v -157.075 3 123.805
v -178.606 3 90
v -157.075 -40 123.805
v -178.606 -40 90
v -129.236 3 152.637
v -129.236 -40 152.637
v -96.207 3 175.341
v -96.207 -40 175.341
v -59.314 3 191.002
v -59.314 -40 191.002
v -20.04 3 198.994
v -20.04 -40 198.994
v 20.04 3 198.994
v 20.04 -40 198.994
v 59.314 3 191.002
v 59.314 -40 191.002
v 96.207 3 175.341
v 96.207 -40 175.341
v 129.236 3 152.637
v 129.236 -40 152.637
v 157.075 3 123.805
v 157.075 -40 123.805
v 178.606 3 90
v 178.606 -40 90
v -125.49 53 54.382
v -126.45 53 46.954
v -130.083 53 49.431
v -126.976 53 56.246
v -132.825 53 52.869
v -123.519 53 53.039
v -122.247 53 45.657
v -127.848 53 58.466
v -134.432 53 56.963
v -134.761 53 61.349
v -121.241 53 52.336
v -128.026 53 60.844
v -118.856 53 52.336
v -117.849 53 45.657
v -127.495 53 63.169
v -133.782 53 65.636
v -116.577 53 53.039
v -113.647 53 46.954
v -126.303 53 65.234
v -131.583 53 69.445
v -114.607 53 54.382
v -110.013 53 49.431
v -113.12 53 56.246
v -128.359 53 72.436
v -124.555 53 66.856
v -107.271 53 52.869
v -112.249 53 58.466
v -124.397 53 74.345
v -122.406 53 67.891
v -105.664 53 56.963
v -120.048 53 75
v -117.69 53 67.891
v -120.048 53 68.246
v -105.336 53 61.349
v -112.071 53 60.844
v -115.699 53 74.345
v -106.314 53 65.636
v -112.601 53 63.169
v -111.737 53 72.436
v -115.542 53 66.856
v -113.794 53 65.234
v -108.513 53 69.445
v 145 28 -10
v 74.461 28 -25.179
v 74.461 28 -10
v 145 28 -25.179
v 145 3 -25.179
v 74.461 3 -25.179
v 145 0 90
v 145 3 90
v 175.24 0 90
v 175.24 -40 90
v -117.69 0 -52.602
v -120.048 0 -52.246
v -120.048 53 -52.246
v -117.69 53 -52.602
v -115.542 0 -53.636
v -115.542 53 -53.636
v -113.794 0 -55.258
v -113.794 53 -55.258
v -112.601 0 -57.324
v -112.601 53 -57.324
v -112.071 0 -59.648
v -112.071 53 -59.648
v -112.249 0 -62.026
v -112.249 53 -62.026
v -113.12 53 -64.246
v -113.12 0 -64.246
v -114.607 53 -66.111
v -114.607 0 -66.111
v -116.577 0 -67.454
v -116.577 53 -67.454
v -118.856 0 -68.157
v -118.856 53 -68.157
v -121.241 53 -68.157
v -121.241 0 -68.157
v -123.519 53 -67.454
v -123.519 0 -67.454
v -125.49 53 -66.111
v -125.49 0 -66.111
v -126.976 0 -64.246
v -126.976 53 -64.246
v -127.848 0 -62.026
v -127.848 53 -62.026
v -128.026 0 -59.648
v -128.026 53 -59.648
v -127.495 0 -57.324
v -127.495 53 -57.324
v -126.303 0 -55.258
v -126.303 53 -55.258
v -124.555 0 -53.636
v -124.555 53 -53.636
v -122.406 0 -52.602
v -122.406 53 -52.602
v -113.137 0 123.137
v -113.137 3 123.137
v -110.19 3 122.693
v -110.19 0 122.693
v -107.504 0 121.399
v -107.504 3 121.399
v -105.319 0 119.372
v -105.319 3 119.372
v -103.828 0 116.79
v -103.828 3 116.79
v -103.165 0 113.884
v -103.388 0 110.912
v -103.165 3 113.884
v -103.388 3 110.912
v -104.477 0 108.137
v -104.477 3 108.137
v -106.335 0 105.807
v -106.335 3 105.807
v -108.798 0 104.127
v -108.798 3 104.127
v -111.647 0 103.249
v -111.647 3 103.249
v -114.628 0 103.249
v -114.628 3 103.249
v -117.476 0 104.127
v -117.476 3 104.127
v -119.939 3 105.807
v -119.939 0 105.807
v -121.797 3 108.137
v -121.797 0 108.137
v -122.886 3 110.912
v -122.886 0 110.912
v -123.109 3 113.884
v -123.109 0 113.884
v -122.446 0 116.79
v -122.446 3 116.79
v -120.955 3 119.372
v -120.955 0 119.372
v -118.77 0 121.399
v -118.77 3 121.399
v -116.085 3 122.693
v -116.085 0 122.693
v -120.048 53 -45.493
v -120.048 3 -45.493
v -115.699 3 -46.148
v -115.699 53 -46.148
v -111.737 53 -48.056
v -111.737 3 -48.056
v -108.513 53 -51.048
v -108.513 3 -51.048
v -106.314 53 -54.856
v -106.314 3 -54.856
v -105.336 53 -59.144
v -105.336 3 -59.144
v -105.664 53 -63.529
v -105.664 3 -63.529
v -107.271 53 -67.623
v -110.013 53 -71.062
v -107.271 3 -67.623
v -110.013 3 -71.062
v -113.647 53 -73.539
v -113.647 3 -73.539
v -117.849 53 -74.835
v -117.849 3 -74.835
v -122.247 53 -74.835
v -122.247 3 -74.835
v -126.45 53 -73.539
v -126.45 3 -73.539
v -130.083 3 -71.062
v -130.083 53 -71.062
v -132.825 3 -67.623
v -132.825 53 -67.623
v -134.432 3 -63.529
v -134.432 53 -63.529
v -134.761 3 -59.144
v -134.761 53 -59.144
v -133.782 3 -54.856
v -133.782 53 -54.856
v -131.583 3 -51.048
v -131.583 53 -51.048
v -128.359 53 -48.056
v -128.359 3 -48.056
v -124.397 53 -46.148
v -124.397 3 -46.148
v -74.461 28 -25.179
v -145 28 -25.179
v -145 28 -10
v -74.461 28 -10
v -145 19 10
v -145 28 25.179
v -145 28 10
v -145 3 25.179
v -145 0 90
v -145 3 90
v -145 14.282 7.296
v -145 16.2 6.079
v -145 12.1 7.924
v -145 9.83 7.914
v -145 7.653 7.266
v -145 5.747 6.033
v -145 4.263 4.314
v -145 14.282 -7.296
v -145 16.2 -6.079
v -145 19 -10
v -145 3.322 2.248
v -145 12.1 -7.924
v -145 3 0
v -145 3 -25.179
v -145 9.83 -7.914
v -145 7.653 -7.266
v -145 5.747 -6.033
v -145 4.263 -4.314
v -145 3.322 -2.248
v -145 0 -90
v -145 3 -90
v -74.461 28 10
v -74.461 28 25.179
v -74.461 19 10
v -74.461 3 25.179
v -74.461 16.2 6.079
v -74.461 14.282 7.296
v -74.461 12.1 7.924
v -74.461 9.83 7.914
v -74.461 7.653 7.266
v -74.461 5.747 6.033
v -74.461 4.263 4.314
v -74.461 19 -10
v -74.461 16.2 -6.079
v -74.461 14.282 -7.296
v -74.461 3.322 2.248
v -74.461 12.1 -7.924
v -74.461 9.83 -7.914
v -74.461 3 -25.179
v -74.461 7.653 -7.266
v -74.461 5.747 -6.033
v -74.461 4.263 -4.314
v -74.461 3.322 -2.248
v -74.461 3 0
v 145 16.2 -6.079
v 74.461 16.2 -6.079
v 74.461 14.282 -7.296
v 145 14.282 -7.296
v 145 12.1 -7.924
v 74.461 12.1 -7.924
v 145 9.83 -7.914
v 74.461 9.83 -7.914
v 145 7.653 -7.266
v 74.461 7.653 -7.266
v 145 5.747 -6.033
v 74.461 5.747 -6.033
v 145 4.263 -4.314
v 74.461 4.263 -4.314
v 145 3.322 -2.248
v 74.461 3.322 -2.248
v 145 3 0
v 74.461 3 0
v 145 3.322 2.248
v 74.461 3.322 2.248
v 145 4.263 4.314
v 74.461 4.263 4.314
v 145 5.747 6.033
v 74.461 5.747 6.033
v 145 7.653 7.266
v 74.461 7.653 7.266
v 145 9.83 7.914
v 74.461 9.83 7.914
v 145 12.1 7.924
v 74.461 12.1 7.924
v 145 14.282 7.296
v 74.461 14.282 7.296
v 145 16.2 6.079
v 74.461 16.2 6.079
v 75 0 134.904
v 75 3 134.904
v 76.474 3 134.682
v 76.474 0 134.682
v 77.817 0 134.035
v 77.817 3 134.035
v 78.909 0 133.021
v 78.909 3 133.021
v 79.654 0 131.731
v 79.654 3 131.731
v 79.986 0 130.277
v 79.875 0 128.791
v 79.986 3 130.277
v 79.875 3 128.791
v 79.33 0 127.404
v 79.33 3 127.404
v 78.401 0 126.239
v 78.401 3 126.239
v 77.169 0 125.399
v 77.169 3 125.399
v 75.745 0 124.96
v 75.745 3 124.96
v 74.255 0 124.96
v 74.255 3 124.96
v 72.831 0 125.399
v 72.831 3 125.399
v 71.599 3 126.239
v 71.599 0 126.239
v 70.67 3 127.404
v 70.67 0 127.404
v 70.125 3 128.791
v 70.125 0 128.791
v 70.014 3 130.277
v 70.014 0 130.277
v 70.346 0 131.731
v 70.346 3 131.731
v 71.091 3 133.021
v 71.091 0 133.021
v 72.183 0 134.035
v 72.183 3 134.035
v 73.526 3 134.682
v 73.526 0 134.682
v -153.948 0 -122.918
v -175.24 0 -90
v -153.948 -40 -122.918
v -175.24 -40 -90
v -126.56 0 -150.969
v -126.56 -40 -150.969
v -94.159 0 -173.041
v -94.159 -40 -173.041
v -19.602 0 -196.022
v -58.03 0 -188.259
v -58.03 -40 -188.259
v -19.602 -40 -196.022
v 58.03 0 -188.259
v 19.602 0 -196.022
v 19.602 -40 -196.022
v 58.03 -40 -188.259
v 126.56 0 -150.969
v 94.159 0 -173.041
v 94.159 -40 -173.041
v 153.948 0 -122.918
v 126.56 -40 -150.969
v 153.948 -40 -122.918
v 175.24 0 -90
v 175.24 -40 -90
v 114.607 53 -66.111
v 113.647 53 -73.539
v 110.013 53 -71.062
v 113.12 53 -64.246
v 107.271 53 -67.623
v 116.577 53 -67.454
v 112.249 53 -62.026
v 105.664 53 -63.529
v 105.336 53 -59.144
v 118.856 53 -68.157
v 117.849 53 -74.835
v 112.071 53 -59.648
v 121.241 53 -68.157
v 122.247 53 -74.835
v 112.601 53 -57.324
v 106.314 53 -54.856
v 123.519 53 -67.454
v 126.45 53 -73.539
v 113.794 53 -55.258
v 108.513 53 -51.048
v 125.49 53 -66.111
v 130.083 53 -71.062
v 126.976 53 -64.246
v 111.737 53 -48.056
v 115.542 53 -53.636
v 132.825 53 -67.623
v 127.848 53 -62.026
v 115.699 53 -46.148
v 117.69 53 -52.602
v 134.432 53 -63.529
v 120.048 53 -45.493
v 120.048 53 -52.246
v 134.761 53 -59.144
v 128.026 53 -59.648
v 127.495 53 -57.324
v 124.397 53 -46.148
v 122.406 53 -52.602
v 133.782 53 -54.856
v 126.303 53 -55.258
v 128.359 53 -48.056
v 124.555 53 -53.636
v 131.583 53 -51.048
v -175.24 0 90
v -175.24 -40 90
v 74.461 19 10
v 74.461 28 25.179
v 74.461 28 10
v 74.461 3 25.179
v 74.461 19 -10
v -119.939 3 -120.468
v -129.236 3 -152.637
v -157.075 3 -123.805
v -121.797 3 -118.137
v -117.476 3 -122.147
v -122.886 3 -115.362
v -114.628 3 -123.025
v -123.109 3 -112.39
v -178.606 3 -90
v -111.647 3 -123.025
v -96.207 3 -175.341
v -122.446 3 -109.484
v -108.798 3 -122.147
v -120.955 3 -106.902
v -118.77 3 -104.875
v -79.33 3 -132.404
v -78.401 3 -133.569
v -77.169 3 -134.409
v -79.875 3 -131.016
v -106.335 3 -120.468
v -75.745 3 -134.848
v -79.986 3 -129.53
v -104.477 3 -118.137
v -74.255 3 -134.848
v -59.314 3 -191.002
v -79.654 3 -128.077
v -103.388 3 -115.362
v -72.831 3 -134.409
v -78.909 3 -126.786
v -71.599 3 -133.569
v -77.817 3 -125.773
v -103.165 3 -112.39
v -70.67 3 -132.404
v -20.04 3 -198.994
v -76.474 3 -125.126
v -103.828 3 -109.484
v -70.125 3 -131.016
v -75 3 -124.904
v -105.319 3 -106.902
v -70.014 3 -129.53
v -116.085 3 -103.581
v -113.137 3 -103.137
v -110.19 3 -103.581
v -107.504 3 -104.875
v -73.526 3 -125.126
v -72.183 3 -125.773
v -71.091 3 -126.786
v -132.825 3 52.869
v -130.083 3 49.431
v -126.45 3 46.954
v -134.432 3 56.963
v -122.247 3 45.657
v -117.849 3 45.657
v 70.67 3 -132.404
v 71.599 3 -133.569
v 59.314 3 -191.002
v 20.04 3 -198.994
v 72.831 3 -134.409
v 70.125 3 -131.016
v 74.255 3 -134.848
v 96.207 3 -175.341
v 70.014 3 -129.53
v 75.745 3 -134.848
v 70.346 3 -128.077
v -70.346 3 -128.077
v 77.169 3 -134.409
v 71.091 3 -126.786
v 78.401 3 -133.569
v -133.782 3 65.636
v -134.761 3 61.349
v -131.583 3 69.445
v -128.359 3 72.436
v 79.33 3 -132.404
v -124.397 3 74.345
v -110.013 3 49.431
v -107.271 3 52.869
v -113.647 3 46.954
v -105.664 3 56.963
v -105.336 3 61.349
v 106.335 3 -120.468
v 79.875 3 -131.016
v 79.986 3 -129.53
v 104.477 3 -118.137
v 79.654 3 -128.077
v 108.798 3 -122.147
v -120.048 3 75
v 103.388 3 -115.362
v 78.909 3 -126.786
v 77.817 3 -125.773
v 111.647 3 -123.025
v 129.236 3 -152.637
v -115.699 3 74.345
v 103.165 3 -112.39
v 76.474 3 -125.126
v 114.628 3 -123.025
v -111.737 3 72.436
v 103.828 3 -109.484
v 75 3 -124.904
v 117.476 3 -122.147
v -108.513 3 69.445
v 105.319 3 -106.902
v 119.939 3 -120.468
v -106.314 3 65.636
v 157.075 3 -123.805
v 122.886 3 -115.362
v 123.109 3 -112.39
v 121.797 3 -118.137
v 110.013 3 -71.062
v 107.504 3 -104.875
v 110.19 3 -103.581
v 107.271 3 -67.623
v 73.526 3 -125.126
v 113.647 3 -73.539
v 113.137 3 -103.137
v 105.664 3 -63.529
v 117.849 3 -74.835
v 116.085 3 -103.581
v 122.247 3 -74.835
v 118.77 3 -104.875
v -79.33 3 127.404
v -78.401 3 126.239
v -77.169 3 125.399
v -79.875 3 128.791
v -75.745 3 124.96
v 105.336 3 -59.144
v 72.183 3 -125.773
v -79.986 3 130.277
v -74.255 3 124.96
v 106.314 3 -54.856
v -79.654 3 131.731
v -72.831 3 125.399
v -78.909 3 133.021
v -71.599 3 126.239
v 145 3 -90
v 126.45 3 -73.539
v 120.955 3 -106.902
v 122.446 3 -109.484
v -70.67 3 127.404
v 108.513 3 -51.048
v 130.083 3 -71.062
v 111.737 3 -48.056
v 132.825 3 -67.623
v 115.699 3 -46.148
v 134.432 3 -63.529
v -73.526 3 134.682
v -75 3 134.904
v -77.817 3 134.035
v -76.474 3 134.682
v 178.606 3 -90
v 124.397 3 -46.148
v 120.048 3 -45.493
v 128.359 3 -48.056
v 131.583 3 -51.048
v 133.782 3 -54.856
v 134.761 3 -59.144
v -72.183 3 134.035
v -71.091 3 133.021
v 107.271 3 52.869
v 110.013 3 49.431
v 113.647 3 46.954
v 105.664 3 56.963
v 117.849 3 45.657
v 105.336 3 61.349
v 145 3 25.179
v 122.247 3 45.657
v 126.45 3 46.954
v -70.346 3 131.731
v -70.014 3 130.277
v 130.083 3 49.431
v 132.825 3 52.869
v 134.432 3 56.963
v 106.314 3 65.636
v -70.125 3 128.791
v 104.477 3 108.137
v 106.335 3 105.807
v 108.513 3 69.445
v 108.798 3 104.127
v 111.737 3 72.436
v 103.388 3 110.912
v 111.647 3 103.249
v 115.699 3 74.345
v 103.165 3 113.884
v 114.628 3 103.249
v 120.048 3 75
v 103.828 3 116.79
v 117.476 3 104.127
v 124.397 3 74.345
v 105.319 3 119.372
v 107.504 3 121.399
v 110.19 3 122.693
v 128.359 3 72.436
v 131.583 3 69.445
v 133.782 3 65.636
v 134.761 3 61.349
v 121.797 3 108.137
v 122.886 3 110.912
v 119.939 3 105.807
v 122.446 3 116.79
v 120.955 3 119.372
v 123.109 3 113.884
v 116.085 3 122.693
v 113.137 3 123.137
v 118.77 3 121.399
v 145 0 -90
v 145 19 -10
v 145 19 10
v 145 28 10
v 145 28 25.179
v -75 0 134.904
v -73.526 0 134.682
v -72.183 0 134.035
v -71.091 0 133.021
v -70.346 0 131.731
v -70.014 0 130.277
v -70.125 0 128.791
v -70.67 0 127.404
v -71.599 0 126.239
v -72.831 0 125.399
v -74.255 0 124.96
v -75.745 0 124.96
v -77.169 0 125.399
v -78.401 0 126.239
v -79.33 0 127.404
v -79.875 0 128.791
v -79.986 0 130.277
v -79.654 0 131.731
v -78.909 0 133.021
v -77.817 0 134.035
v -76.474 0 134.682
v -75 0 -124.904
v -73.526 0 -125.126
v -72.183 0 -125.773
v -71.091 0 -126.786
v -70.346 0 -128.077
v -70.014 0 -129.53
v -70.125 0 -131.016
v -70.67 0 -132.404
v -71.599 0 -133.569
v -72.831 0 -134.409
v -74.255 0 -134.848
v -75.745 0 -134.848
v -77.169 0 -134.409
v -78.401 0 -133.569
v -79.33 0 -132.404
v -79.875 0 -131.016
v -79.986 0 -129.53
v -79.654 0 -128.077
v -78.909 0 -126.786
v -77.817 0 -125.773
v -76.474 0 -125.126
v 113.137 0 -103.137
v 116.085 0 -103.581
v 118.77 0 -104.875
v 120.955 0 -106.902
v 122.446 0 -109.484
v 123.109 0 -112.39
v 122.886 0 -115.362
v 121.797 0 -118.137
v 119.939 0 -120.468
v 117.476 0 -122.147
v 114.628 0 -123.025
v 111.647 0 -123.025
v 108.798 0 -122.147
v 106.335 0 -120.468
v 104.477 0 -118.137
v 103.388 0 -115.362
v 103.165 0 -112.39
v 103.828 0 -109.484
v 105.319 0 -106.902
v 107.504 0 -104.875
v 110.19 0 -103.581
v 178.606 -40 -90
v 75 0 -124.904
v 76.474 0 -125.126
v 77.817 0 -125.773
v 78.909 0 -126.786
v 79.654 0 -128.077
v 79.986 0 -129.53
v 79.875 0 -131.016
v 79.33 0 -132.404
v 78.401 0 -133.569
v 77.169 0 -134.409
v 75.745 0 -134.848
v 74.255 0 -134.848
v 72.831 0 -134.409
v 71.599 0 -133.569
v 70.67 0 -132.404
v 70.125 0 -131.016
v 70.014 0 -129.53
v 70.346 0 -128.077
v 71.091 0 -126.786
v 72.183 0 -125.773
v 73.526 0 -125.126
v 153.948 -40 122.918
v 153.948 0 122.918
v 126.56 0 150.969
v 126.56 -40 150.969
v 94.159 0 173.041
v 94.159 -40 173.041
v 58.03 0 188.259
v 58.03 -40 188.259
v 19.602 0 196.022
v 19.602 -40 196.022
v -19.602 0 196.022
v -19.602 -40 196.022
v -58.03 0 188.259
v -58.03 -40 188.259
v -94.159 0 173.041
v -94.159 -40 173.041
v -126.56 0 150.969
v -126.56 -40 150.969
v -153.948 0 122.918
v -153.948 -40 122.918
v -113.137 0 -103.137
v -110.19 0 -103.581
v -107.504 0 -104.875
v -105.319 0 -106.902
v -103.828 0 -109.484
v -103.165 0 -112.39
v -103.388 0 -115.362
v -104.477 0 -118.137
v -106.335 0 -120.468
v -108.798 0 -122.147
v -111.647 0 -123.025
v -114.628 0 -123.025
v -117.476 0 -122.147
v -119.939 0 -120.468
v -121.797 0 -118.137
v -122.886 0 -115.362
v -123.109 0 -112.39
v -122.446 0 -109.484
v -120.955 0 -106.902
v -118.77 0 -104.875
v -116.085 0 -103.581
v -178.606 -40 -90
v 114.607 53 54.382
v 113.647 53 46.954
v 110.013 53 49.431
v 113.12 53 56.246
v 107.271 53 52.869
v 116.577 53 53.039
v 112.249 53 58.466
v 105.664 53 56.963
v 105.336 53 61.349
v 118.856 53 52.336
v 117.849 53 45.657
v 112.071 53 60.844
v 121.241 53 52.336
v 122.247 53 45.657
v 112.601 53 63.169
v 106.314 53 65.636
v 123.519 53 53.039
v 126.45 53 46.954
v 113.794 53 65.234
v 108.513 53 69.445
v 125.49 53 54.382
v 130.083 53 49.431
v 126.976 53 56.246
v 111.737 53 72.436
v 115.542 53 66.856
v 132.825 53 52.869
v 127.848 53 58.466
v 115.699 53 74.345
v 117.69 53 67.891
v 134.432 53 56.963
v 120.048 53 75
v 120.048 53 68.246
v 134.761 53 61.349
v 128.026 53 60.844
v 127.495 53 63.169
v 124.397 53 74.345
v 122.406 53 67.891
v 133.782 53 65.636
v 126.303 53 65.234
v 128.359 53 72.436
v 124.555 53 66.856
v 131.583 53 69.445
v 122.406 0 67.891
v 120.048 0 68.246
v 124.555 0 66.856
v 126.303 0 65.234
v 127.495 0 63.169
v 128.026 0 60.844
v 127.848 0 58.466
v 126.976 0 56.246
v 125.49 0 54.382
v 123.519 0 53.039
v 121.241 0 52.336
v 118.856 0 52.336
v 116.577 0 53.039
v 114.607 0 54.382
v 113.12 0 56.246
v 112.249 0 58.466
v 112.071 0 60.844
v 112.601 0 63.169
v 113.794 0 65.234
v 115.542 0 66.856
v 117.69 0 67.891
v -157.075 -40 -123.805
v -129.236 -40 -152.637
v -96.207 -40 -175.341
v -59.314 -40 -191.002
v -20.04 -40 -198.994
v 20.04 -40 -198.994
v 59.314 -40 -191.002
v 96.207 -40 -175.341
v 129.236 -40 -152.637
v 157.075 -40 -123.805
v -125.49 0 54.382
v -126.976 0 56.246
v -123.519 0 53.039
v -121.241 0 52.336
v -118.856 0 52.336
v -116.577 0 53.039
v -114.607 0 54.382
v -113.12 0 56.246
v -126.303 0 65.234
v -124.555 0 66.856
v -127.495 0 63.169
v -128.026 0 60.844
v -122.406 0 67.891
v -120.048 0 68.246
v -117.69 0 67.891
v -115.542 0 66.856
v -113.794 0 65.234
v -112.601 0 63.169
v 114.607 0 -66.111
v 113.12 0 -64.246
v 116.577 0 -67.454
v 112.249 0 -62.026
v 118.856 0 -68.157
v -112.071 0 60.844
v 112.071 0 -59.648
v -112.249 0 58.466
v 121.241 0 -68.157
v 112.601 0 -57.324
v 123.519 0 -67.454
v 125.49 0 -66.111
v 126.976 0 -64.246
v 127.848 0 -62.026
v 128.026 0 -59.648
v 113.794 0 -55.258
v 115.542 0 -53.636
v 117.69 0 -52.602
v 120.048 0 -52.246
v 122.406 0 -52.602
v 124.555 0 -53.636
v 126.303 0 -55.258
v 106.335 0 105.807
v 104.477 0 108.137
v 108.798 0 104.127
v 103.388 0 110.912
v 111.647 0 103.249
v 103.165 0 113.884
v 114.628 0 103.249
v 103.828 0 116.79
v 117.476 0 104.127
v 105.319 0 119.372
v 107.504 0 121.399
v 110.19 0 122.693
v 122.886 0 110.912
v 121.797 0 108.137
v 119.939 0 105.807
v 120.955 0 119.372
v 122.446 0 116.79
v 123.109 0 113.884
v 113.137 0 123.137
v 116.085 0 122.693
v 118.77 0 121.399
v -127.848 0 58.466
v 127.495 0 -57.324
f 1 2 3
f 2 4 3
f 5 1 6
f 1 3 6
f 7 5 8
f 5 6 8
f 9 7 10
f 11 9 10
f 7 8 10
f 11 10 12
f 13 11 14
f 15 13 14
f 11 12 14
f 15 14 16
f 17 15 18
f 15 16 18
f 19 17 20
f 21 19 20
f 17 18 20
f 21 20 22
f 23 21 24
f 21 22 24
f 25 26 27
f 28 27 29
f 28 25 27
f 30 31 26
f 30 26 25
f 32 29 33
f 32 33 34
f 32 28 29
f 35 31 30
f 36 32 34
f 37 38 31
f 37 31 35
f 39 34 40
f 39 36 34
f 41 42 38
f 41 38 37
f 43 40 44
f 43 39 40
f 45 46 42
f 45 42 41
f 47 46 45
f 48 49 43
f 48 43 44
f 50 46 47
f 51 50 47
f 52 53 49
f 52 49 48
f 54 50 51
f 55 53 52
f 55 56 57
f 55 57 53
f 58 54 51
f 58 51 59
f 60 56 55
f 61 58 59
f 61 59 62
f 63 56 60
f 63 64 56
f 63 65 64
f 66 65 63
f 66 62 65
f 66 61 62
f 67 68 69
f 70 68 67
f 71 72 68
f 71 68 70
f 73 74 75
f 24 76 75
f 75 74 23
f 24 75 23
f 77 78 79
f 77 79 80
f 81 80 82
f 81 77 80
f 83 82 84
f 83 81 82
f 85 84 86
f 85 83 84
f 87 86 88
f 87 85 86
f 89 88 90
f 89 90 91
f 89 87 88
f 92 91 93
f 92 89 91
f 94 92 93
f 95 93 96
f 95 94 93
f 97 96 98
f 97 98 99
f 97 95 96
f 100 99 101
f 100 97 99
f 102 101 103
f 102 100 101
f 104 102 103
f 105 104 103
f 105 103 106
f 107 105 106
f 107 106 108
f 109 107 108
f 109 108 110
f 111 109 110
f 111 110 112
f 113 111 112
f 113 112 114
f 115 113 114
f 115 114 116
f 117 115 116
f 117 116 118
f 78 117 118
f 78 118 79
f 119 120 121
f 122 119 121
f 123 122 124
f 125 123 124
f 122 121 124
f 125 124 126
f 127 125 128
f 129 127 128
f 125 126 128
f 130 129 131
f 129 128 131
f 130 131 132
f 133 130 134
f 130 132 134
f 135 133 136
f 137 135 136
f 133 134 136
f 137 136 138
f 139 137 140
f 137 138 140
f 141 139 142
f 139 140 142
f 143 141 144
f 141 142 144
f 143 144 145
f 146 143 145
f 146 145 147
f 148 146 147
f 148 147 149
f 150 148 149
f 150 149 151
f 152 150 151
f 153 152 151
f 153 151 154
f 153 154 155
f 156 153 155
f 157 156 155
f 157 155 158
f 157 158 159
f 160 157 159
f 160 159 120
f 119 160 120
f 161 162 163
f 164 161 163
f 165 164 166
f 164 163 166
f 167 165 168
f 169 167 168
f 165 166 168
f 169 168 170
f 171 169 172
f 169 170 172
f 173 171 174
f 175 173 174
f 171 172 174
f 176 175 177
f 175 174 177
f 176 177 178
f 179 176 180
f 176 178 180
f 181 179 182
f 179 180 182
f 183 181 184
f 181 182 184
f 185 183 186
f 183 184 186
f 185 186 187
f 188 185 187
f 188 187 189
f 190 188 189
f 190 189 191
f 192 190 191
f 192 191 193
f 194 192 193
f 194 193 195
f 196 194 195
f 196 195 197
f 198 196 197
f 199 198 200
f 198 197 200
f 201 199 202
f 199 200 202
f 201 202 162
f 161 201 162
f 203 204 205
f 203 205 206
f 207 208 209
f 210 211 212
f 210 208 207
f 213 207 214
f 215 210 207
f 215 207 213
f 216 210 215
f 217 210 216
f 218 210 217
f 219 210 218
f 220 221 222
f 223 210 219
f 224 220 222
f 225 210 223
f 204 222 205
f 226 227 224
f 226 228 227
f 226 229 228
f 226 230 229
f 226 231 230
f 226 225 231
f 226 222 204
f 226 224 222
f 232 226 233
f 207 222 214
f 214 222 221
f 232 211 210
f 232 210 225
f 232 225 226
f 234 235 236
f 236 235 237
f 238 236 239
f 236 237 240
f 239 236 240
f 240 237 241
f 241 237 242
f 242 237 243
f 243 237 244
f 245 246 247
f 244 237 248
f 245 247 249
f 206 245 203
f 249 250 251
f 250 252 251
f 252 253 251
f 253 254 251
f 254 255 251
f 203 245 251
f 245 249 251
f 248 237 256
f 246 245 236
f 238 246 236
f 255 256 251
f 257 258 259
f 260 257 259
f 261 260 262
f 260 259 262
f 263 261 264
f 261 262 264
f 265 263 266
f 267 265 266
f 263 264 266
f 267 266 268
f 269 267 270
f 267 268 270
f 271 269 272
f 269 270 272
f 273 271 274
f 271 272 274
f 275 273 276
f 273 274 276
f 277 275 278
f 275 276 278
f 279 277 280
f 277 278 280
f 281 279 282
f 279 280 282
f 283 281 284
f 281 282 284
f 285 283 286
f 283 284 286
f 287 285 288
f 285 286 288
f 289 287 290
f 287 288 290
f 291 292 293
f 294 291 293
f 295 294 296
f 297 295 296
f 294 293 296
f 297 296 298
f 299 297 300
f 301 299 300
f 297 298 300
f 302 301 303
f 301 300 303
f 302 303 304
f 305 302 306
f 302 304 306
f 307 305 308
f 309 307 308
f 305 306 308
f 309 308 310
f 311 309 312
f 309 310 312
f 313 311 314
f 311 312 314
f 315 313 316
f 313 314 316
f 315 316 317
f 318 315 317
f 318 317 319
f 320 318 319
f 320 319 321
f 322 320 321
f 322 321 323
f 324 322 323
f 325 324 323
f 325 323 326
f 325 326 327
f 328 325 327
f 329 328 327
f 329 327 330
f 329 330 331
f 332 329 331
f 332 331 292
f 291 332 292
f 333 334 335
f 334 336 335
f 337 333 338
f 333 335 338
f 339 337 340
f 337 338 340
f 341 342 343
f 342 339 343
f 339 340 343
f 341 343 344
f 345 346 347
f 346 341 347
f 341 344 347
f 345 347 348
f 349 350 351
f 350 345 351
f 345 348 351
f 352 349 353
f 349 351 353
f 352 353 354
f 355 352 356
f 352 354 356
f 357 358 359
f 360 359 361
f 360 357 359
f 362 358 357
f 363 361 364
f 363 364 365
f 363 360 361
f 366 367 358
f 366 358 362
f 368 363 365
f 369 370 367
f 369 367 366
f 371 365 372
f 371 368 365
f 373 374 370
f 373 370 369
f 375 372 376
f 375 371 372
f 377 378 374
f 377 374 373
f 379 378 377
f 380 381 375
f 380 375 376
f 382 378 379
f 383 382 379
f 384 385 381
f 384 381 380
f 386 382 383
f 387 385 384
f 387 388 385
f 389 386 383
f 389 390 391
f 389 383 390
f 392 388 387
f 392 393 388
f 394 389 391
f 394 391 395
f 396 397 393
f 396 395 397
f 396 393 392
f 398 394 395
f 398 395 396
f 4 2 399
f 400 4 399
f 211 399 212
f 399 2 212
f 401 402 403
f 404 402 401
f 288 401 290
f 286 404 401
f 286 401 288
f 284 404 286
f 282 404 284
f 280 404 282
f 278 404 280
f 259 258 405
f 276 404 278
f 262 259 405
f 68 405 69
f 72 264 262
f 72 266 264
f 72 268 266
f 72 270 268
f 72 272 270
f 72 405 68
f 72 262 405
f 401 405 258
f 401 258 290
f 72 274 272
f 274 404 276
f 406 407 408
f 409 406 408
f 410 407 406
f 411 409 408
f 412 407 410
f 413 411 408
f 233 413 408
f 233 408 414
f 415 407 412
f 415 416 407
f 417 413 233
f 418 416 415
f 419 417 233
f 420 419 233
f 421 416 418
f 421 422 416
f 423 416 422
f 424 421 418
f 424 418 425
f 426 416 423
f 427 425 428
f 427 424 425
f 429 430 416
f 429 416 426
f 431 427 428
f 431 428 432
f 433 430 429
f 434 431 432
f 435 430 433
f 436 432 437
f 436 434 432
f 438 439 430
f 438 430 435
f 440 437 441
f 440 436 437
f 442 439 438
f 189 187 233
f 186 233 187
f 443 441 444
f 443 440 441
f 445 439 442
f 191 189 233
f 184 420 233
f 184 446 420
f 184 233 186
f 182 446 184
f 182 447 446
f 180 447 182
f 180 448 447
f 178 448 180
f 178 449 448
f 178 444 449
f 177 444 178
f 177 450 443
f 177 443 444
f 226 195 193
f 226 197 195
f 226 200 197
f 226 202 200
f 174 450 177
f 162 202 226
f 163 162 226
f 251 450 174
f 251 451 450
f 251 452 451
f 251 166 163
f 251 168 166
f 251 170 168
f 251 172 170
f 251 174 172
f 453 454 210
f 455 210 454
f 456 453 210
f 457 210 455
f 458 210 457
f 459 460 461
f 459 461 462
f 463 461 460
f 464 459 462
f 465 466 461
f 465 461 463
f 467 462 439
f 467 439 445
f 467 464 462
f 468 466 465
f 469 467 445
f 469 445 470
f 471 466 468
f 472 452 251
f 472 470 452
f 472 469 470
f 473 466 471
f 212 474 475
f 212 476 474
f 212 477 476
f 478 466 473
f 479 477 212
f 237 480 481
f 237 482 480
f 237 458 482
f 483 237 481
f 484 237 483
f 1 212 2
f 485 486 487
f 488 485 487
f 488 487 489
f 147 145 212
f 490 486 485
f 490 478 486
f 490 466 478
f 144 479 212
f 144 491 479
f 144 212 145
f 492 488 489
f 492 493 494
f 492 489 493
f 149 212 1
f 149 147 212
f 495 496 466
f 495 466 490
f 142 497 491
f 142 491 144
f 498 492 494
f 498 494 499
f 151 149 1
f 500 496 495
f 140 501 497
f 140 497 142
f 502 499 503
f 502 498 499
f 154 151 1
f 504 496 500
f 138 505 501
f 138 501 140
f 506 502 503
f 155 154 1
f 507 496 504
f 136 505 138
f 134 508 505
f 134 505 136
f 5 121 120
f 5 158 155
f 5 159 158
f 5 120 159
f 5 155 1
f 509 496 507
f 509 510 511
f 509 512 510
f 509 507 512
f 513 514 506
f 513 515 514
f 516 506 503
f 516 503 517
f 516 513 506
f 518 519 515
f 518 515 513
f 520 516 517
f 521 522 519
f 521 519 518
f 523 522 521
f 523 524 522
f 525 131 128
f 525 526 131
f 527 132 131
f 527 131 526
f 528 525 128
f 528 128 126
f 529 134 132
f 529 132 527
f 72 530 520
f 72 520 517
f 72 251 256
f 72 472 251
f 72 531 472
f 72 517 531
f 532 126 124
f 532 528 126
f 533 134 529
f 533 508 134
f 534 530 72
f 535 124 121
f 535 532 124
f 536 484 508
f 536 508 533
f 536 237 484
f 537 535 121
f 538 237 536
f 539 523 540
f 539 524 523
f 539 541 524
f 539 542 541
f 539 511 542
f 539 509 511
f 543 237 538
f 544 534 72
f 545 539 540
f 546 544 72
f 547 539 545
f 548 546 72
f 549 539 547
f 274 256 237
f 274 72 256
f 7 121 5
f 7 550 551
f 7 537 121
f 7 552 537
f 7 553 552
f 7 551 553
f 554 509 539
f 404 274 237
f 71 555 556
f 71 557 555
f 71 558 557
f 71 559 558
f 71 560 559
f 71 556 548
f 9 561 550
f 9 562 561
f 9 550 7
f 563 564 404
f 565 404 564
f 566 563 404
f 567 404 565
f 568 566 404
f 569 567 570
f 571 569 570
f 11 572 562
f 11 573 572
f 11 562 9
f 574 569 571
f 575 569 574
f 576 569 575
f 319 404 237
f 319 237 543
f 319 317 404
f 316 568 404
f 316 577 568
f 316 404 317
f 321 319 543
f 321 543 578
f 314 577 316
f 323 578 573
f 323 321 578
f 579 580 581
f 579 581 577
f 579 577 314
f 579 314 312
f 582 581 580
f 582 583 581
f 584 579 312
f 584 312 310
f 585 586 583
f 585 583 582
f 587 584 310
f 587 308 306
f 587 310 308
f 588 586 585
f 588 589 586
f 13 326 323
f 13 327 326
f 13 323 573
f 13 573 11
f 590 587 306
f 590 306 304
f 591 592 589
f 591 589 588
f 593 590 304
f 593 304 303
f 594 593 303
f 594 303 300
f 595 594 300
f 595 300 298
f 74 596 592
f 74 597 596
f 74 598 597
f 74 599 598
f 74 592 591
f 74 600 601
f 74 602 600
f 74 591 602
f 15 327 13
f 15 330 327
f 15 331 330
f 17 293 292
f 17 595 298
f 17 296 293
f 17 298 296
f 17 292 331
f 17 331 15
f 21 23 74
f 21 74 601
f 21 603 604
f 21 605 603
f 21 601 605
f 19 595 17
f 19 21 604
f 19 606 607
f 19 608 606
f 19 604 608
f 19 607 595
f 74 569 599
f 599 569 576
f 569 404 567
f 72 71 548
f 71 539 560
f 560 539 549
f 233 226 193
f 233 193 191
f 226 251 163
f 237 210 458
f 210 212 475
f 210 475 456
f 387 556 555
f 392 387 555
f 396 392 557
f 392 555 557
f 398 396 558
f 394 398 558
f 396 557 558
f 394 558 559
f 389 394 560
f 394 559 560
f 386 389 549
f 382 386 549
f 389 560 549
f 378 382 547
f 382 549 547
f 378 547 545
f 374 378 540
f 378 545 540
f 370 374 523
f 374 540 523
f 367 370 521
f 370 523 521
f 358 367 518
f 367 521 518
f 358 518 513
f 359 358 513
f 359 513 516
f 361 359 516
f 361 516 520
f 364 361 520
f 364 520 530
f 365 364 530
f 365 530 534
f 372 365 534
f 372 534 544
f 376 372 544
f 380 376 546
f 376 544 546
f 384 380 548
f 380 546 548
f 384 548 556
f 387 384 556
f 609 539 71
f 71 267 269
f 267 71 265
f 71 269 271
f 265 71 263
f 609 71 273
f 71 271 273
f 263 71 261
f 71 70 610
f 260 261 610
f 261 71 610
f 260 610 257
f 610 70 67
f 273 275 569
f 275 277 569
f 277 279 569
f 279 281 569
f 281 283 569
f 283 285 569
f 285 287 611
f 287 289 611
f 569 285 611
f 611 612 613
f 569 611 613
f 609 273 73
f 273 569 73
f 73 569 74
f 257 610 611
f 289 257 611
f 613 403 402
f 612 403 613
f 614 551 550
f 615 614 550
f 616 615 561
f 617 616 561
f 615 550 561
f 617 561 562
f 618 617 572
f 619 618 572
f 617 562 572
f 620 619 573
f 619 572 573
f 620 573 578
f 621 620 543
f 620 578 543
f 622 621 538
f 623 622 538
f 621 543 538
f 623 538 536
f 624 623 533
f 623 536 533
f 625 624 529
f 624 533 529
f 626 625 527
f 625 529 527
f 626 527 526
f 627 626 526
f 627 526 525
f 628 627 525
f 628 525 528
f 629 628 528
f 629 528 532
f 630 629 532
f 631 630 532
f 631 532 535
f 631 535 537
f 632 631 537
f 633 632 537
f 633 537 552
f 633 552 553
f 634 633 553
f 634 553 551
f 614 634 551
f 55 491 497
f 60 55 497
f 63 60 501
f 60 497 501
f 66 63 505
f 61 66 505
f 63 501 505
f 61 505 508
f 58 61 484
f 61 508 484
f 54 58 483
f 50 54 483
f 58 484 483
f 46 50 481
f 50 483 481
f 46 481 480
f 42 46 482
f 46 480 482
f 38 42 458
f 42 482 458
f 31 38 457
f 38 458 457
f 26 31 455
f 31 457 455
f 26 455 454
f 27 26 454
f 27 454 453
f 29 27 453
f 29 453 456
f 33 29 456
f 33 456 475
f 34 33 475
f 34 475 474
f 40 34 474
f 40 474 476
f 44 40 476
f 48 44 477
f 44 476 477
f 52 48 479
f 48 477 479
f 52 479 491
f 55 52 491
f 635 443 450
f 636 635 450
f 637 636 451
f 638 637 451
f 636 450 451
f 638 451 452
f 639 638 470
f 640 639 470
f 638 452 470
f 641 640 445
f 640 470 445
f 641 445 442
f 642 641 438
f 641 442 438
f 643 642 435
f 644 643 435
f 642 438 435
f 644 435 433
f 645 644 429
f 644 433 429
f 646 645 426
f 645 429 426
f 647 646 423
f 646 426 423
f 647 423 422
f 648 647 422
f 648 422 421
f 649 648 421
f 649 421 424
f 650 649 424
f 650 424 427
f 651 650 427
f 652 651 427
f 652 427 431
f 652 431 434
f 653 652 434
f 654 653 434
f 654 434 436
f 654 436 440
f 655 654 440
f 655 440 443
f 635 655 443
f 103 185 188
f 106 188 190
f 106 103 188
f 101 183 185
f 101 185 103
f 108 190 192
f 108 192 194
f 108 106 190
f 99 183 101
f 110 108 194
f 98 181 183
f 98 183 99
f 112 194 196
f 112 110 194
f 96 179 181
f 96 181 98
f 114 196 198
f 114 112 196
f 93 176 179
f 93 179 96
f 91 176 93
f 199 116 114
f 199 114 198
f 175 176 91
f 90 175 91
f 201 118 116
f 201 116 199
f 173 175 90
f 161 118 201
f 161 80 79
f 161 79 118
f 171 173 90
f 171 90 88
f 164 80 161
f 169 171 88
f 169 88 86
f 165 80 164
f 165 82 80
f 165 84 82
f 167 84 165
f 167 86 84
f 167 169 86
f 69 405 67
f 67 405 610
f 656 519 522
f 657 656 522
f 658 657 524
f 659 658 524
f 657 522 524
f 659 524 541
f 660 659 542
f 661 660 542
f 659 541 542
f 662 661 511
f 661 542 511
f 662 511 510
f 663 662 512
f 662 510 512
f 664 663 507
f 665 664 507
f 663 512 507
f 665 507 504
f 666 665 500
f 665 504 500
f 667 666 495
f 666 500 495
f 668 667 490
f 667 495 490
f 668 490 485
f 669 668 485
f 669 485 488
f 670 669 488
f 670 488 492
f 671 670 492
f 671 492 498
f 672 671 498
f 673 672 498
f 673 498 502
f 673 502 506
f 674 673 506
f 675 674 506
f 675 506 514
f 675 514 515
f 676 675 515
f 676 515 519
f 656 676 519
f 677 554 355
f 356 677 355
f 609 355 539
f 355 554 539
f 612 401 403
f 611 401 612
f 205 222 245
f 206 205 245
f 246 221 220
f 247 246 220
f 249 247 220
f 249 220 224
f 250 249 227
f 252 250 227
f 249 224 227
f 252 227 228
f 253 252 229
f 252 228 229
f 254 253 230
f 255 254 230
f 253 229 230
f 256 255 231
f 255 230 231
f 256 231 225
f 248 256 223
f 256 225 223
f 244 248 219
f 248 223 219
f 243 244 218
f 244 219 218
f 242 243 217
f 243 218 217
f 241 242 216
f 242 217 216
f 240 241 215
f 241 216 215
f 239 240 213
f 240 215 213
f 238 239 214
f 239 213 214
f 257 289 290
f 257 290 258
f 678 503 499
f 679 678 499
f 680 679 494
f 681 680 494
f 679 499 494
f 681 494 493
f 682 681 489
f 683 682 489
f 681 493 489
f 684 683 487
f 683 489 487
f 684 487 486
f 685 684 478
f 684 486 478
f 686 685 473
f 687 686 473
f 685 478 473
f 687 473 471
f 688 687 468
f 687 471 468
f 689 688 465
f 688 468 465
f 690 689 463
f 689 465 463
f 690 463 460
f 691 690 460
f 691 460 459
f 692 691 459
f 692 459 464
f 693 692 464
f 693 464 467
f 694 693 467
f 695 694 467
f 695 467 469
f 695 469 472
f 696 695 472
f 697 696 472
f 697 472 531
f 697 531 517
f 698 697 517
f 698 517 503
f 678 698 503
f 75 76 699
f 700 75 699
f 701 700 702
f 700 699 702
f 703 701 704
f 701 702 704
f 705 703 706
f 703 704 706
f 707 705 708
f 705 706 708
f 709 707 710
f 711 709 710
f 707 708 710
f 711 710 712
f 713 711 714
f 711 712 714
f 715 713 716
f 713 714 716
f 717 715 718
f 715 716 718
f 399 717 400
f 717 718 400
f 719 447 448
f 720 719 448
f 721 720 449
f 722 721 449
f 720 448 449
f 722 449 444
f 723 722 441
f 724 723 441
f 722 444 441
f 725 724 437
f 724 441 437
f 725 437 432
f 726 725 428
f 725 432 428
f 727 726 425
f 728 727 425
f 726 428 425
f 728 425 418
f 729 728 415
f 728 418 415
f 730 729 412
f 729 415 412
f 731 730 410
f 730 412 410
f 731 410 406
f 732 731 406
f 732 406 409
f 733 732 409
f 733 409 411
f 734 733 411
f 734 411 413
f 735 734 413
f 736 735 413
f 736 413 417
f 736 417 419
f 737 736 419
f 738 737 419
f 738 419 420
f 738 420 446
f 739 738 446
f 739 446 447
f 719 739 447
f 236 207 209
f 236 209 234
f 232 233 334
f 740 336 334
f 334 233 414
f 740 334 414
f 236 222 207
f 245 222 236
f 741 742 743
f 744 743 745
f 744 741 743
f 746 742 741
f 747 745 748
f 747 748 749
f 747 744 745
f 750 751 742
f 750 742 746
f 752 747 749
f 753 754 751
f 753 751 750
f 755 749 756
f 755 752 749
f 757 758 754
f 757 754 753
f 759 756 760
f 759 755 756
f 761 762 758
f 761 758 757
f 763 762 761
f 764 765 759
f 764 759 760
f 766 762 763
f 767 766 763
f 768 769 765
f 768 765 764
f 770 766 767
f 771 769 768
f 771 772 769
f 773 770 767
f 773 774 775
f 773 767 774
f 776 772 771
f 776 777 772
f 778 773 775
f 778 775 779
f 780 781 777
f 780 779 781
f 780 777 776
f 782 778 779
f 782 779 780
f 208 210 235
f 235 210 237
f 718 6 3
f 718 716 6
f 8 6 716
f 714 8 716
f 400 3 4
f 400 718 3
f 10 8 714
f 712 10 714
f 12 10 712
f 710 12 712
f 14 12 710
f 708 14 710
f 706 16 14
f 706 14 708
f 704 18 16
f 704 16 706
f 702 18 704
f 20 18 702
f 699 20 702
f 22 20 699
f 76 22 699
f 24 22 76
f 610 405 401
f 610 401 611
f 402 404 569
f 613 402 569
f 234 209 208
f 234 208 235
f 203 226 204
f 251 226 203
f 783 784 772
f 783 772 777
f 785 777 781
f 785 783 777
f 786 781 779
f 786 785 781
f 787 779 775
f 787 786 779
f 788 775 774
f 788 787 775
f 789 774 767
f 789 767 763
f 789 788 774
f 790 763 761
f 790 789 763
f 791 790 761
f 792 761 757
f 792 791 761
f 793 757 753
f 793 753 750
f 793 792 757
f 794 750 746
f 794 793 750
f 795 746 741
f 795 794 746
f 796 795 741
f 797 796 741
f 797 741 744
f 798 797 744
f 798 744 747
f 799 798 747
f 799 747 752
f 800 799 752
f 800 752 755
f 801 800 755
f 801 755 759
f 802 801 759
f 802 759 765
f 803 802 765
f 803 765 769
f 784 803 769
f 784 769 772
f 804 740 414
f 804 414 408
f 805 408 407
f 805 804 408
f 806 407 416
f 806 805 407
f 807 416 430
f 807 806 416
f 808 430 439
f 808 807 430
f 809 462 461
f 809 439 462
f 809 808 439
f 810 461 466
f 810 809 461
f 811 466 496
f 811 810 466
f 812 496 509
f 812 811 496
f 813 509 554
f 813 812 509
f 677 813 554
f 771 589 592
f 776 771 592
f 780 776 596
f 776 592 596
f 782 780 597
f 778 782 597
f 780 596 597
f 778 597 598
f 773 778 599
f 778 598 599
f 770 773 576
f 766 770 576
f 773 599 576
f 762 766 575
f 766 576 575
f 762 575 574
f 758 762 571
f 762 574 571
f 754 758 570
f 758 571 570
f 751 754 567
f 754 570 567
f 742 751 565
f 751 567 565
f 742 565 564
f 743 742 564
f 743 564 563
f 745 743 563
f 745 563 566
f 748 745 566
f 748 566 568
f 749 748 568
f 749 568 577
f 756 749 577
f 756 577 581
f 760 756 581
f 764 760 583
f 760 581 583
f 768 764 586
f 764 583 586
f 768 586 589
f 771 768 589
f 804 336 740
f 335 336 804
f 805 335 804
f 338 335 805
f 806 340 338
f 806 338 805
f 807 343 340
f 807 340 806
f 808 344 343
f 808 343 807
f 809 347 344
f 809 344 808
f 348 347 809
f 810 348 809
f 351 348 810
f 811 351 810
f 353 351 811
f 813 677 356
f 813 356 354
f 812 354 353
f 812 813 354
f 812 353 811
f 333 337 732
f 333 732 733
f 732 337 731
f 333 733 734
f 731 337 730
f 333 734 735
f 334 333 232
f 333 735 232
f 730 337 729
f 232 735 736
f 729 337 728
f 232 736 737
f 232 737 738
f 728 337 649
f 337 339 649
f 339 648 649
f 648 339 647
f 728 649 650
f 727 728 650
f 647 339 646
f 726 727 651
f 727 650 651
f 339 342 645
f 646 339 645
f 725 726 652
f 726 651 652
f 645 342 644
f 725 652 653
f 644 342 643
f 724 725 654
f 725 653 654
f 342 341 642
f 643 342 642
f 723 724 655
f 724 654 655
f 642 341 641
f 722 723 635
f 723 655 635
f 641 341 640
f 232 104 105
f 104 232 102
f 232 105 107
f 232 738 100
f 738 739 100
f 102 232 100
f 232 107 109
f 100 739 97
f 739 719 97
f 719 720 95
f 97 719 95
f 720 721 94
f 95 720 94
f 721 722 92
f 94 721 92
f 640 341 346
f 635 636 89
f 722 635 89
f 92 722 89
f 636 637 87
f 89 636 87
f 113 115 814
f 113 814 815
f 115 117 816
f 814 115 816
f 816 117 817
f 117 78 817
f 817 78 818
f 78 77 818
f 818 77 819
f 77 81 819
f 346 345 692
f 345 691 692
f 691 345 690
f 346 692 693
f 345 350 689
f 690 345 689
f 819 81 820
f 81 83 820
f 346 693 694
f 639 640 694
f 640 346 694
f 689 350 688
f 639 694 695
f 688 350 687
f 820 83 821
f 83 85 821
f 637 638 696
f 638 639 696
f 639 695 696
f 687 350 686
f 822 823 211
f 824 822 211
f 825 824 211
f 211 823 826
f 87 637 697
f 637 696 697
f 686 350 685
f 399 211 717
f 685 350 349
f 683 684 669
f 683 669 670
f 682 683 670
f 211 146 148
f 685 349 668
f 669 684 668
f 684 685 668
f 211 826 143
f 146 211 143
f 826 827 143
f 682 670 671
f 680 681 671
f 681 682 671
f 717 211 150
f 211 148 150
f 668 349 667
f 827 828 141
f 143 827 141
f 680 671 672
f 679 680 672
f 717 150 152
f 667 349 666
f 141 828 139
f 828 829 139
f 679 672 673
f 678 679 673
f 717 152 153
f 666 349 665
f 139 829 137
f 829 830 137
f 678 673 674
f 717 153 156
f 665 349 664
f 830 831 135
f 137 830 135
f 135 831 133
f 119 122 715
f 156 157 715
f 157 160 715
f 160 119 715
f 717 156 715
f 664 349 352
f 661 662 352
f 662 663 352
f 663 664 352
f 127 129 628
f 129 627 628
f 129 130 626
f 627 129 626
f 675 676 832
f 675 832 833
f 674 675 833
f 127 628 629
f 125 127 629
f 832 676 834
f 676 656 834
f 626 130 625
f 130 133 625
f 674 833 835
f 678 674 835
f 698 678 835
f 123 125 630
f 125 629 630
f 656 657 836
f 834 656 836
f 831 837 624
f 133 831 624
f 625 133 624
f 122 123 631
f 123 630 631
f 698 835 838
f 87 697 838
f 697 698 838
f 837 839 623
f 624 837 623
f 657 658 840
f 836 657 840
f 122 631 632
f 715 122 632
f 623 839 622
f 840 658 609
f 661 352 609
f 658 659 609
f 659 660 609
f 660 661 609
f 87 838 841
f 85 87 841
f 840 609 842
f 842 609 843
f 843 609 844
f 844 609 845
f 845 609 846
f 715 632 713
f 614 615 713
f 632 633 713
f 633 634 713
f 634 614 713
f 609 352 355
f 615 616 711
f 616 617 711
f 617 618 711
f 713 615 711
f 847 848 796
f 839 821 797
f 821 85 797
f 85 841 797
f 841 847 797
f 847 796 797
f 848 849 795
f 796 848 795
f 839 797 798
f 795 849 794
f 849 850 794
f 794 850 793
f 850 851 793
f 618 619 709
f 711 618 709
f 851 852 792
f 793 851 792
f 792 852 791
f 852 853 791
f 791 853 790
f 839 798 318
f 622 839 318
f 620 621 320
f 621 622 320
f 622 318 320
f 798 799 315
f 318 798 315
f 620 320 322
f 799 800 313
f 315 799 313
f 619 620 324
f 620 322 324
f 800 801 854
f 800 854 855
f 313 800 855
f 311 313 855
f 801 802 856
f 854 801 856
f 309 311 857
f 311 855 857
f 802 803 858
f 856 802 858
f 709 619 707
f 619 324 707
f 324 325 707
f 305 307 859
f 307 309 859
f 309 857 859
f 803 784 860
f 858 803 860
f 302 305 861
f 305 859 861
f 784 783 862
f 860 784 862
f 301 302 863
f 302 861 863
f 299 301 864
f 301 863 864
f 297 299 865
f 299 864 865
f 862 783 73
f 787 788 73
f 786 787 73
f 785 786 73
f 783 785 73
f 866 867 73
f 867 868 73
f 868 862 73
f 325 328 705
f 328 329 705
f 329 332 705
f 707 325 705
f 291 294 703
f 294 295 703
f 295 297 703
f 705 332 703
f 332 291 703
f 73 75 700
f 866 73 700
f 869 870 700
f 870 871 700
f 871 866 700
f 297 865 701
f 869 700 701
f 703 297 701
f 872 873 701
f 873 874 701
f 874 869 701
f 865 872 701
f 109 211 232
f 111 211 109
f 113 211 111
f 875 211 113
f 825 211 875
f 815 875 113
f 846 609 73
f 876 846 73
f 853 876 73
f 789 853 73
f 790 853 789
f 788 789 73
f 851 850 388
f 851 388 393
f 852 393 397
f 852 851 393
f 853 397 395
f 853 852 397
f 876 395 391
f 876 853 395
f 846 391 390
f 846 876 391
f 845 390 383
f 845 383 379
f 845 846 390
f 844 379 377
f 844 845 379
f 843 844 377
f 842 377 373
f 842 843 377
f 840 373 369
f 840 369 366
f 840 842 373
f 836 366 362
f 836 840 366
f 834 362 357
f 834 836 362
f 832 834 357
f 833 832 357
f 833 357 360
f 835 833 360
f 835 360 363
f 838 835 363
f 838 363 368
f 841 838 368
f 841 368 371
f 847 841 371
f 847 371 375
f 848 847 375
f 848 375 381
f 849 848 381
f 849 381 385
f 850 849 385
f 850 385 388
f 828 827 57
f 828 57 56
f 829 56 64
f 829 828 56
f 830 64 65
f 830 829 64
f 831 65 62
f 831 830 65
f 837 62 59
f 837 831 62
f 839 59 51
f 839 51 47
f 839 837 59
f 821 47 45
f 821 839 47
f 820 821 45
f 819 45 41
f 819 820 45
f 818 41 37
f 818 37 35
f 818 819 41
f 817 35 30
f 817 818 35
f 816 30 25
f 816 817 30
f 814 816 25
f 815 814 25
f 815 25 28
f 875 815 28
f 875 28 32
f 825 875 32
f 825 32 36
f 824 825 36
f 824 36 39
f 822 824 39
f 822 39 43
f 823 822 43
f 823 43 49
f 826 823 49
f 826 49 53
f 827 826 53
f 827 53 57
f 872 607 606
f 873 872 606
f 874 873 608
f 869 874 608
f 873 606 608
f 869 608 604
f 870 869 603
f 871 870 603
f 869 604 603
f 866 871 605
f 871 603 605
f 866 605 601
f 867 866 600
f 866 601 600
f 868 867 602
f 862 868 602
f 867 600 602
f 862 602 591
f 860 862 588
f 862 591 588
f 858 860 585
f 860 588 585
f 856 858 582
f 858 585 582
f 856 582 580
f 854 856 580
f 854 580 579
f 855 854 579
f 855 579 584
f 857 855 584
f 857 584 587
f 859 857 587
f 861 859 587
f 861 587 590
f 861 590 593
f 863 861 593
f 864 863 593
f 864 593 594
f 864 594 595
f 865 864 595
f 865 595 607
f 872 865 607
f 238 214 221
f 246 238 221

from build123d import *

# Parameters (mm, degrees)
SKETCH_1_R          = 200
EXTRUDE_1_DEPTH     = 3
EXTRUDE_START       = 40
SKETCH_2_R          = 200
SKETCH_2_R_2        = 197
EXTRUDE_2_DEPTH     = 40
SKETCH_3_R          = 10
SKETCH_3_R_2        = 5
CUT_EXTRUDE_2_DEPTH = 287.092642338
SKETCH_4_W          = 70.538651056
SKETCH_4_H          = 15.178755013
EXTRUDE_4_DEPTH     = 25
SKETCH_7_W          = 70.538651056
SKETCH_7_H          = 20
EXTRUDE_5_DEPTH     = 16
CUT_EXTRUDE_5_DEPTH = 383.518831155
SKETCH_10_R         = 14.753670985
SKETCH_10_R_2       = 8
EXTRUDE_8_DEPTH     = 50
CUT_EXTRUDE_START   = -50
SKETCH_12_R         = 8
CUT_EXTRUDE_8_DEPTH = 50


with BuildPart() as part:
    # 草图1 → 凸台-拉伸1 (new body)
    with BuildSketch(Plane(origin=(0, 0, 0), x_dir=(1, 0, 0), z_dir=(0, 1, 0))):
        with Locations(Location((0, 0, 0), (0, 0, 270))):
            Circle(SKETCH_1_R)
    extrude(amount=EXTRUDE_1_DEPTH)

    # 草图2 → 凸台-拉伸2 (add)
    with BuildSketch(Plane.XZ.offset(EXTRUDE_START)):
        with Locations(Location((0, 0, 0), (0, 0, 270))):
            Circle(SKETCH_2_R)
        with Locations(Location((0, 0, 0), (0, 0, 270))):
            Circle(SKETCH_2_R_2, mode=Mode.SUBTRACT)
    extrude(amount=-EXTRUDE_2_DEPTH)

    # 草图3 → 切除-拉伸2 (cut, through all)
    with BuildSketch(Plane(origin=(0, 3, 0), x_dir=(1, 0, 0), z_dir=(0, 1, 0))):
        with BuildLine():
            ThreePointArc((200, 0), (194.577930659, 46.253960917), (178.605710995, 90))
            Line((178.605710995, 90), (145, 90))
            Line((145, 90), (145, -90))
            Line((145, -90), (178.605710995, -90))
            ThreePointArc((178.605710995, -90), (194.577930659, -46.253960917), (200, 0))
        make_face()
        with BuildLine():
            Line((-145, 90), (-178.605710995, 90))
            ThreePointArc((-178.605710995, 90), (-200, 0), (-178.605710995, -90))
            Line((-178.605710995, -90), (-145, -90))
            Line((-145, -90), (-145, 90))
        make_face()
        with Locations(Location((-113.13708499, 113.13708499, 0), (0, 0, 270))):
            Circle(SKETCH_3_R)
        with Locations(Location((-113.13708499, -113.13708499, 0), (0, 0, 270))):
            Circle(SKETCH_3_R)
        with Locations(Location((-75, 129.903810568, 0), (0, 0, 270))):
            Circle(SKETCH_3_R_2)
        with Locations(Location((113.13708499, 113.13708499, 0), (0, 0, 270))):
            Circle(SKETCH_3_R)
        with Locations(Location((75, 129.903810568, 0), (0, 0, 270))):
            Circle(SKETCH_3_R_2)
        with Locations(Location((-75, -129.903810568, 0), (0, 0, 270))):
            Circle(SKETCH_3_R_2)
        with Locations(Location((113.13708499, -113.13708499, 0), (0, 0, 270))):
            Circle(SKETCH_3_R)
        with Locations(Location((75, -129.903810568, 0), (0, 0, 270))):
            Circle(SKETCH_3_R_2)
    extrude(amount=-CUT_EXTRUDE_2_DEPTH, mode=Mode.SUBTRACT)

    # 草图4 → 凸台-拉伸4 (add)
    with BuildSketch(Plane(origin=(0, 3, 0), x_dir=(1, 0, 0), z_dir=(0, 1, 0))):
        with Locations((-109.730674472, 17.589377506)):
            Rectangle(SKETCH_4_W, SKETCH_4_H)
        with Locations((-109.730674472, -17.589377506)):
            Rectangle(SKETCH_4_W, SKETCH_4_H)
        with Locations((109.730674472, 17.589377506)):
            Rectangle(SKETCH_4_W, SKETCH_4_H)
        with Locations((109.730674472, -17.589377506)):
            Rectangle(SKETCH_4_W, SKETCH_4_H)
    extrude(amount=EXTRUDE_4_DEPTH)

    # 草图7 → 凸台-拉伸5 (add)
    with BuildSketch(Plane(origin=(0, 3, 0), x_dir=(1, 0, 0), z_dir=(0, 1, 0))):
        with Locations((-109.730674472, 0)):
            Rectangle(SKETCH_7_W, SKETCH_7_H)
        with Locations((109.730674472, 0)):
            Rectangle(SKETCH_7_W, SKETCH_7_H)
    extrude(amount=EXTRUDE_5_DEPTH)

    # 草图8 → 切除-拉伸5 (cut, through all)
    with BuildSketch(Plane.ZY.offset(145)):
        with BuildLine():
            ThreePointArc((-6.079473661, 16.2), (0, 3), (6.079473661, 16.2))
            Line((6.079473661, 16.2), (-6.079473661, 16.2))
        make_face()
    extrude(amount=-CUT_EXTRUDE_5_DEPTH, mode=Mode.SUBTRACT)

    # 草图10 → 凸台-拉伸8 (add)
    # profile 1 of 4: a face of its own
    with BuildSketch(Plane(origin=(0, 3, 0), x_dir=(1, 0, 0), z_dir=(0, 1, 0))):
        with Locations(Location((-120.048184131, 60.246329015, 0), (0, 0, 270))):
            Circle(SKETCH_10_R)
        with Locations(Location((-120.048184131, 60.246329015, 0), (0, 0, 270))):
            Circle(SKETCH_10_R_2, mode=Mode.SUBTRACT)
    # profile 2 of 4: a face of its own
    with BuildSketch(Plane(origin=(0, 3, 0), x_dir=(1, 0, 0), z_dir=(0, 1, 0))):
        with Locations(Location((-120.048184131, -60.246329015, 0), (0, 0, 270))):
            Circle(SKETCH_10_R)
        with Locations(Location((-120.048184131, -60.246329015, 0), (0, 0, 270))):
            Circle(SKETCH_10_R_2, mode=Mode.SUBTRACT)
    # profile 3 of 4: a face of its own
    with BuildSketch(Plane(origin=(0, 3, 0), x_dir=(1, 0, 0), z_dir=(0, 1, 0))):
        with Locations(Location((120.048184131, -60.246329015, 0), (0, 0, 270))):
            Circle(SKETCH_10_R)
        with Locations(Location((120.048184131, -60.246329015, 0), (0, 0, 270))):
            Circle(SKETCH_10_R_2, mode=Mode.SUBTRACT)
    # profile 4 of 4: a face of its own
    with BuildSketch(Plane(origin=(0, 3, 0), x_dir=(1, 0, 0), z_dir=(0, 1, 0))):
        with Locations(Location((120.048184131, 60.246329015, 0), (0, 0, 270))):
            Circle(SKETCH_10_R)
        with Locations(Location((120.048184131, 60.246329015, 0), (0, 0, 270))):
            Circle(SKETCH_10_R_2, mode=Mode.SUBTRACT)
    extrude(amount=EXTRUDE_8_DEPTH)

    # 草图12 → 切除-拉伸8 (cut)
    with BuildSketch(Plane(origin=(0, 3, 0), x_dir=(1, 0, 0), z_dir=(0, 1, 0)).offset(CUT_EXTRUDE_START)):
        with Locations(Location((-120.048184131, 60.246329015, 0), (0, 0, 270))):
            Circle(SKETCH_12_R)
        with Locations(Location((-120.048184131, -60.246329015, 0), (0, 0, 270))):
            Circle(SKETCH_12_R)
        with Locations(Location((120.048184131, -60.246329015, 0), (0, 0, 270))):
            Circle(SKETCH_12_R)
        with Locations(Location((120.048184131, 60.246329015, 0), (0, 0, 270))):
            Circle(SKETCH_12_R)
    extrude(amount=CUT_EXTRUDE_8_DEPTH, mode=Mode.SUBTRACT)


solid = part.part
